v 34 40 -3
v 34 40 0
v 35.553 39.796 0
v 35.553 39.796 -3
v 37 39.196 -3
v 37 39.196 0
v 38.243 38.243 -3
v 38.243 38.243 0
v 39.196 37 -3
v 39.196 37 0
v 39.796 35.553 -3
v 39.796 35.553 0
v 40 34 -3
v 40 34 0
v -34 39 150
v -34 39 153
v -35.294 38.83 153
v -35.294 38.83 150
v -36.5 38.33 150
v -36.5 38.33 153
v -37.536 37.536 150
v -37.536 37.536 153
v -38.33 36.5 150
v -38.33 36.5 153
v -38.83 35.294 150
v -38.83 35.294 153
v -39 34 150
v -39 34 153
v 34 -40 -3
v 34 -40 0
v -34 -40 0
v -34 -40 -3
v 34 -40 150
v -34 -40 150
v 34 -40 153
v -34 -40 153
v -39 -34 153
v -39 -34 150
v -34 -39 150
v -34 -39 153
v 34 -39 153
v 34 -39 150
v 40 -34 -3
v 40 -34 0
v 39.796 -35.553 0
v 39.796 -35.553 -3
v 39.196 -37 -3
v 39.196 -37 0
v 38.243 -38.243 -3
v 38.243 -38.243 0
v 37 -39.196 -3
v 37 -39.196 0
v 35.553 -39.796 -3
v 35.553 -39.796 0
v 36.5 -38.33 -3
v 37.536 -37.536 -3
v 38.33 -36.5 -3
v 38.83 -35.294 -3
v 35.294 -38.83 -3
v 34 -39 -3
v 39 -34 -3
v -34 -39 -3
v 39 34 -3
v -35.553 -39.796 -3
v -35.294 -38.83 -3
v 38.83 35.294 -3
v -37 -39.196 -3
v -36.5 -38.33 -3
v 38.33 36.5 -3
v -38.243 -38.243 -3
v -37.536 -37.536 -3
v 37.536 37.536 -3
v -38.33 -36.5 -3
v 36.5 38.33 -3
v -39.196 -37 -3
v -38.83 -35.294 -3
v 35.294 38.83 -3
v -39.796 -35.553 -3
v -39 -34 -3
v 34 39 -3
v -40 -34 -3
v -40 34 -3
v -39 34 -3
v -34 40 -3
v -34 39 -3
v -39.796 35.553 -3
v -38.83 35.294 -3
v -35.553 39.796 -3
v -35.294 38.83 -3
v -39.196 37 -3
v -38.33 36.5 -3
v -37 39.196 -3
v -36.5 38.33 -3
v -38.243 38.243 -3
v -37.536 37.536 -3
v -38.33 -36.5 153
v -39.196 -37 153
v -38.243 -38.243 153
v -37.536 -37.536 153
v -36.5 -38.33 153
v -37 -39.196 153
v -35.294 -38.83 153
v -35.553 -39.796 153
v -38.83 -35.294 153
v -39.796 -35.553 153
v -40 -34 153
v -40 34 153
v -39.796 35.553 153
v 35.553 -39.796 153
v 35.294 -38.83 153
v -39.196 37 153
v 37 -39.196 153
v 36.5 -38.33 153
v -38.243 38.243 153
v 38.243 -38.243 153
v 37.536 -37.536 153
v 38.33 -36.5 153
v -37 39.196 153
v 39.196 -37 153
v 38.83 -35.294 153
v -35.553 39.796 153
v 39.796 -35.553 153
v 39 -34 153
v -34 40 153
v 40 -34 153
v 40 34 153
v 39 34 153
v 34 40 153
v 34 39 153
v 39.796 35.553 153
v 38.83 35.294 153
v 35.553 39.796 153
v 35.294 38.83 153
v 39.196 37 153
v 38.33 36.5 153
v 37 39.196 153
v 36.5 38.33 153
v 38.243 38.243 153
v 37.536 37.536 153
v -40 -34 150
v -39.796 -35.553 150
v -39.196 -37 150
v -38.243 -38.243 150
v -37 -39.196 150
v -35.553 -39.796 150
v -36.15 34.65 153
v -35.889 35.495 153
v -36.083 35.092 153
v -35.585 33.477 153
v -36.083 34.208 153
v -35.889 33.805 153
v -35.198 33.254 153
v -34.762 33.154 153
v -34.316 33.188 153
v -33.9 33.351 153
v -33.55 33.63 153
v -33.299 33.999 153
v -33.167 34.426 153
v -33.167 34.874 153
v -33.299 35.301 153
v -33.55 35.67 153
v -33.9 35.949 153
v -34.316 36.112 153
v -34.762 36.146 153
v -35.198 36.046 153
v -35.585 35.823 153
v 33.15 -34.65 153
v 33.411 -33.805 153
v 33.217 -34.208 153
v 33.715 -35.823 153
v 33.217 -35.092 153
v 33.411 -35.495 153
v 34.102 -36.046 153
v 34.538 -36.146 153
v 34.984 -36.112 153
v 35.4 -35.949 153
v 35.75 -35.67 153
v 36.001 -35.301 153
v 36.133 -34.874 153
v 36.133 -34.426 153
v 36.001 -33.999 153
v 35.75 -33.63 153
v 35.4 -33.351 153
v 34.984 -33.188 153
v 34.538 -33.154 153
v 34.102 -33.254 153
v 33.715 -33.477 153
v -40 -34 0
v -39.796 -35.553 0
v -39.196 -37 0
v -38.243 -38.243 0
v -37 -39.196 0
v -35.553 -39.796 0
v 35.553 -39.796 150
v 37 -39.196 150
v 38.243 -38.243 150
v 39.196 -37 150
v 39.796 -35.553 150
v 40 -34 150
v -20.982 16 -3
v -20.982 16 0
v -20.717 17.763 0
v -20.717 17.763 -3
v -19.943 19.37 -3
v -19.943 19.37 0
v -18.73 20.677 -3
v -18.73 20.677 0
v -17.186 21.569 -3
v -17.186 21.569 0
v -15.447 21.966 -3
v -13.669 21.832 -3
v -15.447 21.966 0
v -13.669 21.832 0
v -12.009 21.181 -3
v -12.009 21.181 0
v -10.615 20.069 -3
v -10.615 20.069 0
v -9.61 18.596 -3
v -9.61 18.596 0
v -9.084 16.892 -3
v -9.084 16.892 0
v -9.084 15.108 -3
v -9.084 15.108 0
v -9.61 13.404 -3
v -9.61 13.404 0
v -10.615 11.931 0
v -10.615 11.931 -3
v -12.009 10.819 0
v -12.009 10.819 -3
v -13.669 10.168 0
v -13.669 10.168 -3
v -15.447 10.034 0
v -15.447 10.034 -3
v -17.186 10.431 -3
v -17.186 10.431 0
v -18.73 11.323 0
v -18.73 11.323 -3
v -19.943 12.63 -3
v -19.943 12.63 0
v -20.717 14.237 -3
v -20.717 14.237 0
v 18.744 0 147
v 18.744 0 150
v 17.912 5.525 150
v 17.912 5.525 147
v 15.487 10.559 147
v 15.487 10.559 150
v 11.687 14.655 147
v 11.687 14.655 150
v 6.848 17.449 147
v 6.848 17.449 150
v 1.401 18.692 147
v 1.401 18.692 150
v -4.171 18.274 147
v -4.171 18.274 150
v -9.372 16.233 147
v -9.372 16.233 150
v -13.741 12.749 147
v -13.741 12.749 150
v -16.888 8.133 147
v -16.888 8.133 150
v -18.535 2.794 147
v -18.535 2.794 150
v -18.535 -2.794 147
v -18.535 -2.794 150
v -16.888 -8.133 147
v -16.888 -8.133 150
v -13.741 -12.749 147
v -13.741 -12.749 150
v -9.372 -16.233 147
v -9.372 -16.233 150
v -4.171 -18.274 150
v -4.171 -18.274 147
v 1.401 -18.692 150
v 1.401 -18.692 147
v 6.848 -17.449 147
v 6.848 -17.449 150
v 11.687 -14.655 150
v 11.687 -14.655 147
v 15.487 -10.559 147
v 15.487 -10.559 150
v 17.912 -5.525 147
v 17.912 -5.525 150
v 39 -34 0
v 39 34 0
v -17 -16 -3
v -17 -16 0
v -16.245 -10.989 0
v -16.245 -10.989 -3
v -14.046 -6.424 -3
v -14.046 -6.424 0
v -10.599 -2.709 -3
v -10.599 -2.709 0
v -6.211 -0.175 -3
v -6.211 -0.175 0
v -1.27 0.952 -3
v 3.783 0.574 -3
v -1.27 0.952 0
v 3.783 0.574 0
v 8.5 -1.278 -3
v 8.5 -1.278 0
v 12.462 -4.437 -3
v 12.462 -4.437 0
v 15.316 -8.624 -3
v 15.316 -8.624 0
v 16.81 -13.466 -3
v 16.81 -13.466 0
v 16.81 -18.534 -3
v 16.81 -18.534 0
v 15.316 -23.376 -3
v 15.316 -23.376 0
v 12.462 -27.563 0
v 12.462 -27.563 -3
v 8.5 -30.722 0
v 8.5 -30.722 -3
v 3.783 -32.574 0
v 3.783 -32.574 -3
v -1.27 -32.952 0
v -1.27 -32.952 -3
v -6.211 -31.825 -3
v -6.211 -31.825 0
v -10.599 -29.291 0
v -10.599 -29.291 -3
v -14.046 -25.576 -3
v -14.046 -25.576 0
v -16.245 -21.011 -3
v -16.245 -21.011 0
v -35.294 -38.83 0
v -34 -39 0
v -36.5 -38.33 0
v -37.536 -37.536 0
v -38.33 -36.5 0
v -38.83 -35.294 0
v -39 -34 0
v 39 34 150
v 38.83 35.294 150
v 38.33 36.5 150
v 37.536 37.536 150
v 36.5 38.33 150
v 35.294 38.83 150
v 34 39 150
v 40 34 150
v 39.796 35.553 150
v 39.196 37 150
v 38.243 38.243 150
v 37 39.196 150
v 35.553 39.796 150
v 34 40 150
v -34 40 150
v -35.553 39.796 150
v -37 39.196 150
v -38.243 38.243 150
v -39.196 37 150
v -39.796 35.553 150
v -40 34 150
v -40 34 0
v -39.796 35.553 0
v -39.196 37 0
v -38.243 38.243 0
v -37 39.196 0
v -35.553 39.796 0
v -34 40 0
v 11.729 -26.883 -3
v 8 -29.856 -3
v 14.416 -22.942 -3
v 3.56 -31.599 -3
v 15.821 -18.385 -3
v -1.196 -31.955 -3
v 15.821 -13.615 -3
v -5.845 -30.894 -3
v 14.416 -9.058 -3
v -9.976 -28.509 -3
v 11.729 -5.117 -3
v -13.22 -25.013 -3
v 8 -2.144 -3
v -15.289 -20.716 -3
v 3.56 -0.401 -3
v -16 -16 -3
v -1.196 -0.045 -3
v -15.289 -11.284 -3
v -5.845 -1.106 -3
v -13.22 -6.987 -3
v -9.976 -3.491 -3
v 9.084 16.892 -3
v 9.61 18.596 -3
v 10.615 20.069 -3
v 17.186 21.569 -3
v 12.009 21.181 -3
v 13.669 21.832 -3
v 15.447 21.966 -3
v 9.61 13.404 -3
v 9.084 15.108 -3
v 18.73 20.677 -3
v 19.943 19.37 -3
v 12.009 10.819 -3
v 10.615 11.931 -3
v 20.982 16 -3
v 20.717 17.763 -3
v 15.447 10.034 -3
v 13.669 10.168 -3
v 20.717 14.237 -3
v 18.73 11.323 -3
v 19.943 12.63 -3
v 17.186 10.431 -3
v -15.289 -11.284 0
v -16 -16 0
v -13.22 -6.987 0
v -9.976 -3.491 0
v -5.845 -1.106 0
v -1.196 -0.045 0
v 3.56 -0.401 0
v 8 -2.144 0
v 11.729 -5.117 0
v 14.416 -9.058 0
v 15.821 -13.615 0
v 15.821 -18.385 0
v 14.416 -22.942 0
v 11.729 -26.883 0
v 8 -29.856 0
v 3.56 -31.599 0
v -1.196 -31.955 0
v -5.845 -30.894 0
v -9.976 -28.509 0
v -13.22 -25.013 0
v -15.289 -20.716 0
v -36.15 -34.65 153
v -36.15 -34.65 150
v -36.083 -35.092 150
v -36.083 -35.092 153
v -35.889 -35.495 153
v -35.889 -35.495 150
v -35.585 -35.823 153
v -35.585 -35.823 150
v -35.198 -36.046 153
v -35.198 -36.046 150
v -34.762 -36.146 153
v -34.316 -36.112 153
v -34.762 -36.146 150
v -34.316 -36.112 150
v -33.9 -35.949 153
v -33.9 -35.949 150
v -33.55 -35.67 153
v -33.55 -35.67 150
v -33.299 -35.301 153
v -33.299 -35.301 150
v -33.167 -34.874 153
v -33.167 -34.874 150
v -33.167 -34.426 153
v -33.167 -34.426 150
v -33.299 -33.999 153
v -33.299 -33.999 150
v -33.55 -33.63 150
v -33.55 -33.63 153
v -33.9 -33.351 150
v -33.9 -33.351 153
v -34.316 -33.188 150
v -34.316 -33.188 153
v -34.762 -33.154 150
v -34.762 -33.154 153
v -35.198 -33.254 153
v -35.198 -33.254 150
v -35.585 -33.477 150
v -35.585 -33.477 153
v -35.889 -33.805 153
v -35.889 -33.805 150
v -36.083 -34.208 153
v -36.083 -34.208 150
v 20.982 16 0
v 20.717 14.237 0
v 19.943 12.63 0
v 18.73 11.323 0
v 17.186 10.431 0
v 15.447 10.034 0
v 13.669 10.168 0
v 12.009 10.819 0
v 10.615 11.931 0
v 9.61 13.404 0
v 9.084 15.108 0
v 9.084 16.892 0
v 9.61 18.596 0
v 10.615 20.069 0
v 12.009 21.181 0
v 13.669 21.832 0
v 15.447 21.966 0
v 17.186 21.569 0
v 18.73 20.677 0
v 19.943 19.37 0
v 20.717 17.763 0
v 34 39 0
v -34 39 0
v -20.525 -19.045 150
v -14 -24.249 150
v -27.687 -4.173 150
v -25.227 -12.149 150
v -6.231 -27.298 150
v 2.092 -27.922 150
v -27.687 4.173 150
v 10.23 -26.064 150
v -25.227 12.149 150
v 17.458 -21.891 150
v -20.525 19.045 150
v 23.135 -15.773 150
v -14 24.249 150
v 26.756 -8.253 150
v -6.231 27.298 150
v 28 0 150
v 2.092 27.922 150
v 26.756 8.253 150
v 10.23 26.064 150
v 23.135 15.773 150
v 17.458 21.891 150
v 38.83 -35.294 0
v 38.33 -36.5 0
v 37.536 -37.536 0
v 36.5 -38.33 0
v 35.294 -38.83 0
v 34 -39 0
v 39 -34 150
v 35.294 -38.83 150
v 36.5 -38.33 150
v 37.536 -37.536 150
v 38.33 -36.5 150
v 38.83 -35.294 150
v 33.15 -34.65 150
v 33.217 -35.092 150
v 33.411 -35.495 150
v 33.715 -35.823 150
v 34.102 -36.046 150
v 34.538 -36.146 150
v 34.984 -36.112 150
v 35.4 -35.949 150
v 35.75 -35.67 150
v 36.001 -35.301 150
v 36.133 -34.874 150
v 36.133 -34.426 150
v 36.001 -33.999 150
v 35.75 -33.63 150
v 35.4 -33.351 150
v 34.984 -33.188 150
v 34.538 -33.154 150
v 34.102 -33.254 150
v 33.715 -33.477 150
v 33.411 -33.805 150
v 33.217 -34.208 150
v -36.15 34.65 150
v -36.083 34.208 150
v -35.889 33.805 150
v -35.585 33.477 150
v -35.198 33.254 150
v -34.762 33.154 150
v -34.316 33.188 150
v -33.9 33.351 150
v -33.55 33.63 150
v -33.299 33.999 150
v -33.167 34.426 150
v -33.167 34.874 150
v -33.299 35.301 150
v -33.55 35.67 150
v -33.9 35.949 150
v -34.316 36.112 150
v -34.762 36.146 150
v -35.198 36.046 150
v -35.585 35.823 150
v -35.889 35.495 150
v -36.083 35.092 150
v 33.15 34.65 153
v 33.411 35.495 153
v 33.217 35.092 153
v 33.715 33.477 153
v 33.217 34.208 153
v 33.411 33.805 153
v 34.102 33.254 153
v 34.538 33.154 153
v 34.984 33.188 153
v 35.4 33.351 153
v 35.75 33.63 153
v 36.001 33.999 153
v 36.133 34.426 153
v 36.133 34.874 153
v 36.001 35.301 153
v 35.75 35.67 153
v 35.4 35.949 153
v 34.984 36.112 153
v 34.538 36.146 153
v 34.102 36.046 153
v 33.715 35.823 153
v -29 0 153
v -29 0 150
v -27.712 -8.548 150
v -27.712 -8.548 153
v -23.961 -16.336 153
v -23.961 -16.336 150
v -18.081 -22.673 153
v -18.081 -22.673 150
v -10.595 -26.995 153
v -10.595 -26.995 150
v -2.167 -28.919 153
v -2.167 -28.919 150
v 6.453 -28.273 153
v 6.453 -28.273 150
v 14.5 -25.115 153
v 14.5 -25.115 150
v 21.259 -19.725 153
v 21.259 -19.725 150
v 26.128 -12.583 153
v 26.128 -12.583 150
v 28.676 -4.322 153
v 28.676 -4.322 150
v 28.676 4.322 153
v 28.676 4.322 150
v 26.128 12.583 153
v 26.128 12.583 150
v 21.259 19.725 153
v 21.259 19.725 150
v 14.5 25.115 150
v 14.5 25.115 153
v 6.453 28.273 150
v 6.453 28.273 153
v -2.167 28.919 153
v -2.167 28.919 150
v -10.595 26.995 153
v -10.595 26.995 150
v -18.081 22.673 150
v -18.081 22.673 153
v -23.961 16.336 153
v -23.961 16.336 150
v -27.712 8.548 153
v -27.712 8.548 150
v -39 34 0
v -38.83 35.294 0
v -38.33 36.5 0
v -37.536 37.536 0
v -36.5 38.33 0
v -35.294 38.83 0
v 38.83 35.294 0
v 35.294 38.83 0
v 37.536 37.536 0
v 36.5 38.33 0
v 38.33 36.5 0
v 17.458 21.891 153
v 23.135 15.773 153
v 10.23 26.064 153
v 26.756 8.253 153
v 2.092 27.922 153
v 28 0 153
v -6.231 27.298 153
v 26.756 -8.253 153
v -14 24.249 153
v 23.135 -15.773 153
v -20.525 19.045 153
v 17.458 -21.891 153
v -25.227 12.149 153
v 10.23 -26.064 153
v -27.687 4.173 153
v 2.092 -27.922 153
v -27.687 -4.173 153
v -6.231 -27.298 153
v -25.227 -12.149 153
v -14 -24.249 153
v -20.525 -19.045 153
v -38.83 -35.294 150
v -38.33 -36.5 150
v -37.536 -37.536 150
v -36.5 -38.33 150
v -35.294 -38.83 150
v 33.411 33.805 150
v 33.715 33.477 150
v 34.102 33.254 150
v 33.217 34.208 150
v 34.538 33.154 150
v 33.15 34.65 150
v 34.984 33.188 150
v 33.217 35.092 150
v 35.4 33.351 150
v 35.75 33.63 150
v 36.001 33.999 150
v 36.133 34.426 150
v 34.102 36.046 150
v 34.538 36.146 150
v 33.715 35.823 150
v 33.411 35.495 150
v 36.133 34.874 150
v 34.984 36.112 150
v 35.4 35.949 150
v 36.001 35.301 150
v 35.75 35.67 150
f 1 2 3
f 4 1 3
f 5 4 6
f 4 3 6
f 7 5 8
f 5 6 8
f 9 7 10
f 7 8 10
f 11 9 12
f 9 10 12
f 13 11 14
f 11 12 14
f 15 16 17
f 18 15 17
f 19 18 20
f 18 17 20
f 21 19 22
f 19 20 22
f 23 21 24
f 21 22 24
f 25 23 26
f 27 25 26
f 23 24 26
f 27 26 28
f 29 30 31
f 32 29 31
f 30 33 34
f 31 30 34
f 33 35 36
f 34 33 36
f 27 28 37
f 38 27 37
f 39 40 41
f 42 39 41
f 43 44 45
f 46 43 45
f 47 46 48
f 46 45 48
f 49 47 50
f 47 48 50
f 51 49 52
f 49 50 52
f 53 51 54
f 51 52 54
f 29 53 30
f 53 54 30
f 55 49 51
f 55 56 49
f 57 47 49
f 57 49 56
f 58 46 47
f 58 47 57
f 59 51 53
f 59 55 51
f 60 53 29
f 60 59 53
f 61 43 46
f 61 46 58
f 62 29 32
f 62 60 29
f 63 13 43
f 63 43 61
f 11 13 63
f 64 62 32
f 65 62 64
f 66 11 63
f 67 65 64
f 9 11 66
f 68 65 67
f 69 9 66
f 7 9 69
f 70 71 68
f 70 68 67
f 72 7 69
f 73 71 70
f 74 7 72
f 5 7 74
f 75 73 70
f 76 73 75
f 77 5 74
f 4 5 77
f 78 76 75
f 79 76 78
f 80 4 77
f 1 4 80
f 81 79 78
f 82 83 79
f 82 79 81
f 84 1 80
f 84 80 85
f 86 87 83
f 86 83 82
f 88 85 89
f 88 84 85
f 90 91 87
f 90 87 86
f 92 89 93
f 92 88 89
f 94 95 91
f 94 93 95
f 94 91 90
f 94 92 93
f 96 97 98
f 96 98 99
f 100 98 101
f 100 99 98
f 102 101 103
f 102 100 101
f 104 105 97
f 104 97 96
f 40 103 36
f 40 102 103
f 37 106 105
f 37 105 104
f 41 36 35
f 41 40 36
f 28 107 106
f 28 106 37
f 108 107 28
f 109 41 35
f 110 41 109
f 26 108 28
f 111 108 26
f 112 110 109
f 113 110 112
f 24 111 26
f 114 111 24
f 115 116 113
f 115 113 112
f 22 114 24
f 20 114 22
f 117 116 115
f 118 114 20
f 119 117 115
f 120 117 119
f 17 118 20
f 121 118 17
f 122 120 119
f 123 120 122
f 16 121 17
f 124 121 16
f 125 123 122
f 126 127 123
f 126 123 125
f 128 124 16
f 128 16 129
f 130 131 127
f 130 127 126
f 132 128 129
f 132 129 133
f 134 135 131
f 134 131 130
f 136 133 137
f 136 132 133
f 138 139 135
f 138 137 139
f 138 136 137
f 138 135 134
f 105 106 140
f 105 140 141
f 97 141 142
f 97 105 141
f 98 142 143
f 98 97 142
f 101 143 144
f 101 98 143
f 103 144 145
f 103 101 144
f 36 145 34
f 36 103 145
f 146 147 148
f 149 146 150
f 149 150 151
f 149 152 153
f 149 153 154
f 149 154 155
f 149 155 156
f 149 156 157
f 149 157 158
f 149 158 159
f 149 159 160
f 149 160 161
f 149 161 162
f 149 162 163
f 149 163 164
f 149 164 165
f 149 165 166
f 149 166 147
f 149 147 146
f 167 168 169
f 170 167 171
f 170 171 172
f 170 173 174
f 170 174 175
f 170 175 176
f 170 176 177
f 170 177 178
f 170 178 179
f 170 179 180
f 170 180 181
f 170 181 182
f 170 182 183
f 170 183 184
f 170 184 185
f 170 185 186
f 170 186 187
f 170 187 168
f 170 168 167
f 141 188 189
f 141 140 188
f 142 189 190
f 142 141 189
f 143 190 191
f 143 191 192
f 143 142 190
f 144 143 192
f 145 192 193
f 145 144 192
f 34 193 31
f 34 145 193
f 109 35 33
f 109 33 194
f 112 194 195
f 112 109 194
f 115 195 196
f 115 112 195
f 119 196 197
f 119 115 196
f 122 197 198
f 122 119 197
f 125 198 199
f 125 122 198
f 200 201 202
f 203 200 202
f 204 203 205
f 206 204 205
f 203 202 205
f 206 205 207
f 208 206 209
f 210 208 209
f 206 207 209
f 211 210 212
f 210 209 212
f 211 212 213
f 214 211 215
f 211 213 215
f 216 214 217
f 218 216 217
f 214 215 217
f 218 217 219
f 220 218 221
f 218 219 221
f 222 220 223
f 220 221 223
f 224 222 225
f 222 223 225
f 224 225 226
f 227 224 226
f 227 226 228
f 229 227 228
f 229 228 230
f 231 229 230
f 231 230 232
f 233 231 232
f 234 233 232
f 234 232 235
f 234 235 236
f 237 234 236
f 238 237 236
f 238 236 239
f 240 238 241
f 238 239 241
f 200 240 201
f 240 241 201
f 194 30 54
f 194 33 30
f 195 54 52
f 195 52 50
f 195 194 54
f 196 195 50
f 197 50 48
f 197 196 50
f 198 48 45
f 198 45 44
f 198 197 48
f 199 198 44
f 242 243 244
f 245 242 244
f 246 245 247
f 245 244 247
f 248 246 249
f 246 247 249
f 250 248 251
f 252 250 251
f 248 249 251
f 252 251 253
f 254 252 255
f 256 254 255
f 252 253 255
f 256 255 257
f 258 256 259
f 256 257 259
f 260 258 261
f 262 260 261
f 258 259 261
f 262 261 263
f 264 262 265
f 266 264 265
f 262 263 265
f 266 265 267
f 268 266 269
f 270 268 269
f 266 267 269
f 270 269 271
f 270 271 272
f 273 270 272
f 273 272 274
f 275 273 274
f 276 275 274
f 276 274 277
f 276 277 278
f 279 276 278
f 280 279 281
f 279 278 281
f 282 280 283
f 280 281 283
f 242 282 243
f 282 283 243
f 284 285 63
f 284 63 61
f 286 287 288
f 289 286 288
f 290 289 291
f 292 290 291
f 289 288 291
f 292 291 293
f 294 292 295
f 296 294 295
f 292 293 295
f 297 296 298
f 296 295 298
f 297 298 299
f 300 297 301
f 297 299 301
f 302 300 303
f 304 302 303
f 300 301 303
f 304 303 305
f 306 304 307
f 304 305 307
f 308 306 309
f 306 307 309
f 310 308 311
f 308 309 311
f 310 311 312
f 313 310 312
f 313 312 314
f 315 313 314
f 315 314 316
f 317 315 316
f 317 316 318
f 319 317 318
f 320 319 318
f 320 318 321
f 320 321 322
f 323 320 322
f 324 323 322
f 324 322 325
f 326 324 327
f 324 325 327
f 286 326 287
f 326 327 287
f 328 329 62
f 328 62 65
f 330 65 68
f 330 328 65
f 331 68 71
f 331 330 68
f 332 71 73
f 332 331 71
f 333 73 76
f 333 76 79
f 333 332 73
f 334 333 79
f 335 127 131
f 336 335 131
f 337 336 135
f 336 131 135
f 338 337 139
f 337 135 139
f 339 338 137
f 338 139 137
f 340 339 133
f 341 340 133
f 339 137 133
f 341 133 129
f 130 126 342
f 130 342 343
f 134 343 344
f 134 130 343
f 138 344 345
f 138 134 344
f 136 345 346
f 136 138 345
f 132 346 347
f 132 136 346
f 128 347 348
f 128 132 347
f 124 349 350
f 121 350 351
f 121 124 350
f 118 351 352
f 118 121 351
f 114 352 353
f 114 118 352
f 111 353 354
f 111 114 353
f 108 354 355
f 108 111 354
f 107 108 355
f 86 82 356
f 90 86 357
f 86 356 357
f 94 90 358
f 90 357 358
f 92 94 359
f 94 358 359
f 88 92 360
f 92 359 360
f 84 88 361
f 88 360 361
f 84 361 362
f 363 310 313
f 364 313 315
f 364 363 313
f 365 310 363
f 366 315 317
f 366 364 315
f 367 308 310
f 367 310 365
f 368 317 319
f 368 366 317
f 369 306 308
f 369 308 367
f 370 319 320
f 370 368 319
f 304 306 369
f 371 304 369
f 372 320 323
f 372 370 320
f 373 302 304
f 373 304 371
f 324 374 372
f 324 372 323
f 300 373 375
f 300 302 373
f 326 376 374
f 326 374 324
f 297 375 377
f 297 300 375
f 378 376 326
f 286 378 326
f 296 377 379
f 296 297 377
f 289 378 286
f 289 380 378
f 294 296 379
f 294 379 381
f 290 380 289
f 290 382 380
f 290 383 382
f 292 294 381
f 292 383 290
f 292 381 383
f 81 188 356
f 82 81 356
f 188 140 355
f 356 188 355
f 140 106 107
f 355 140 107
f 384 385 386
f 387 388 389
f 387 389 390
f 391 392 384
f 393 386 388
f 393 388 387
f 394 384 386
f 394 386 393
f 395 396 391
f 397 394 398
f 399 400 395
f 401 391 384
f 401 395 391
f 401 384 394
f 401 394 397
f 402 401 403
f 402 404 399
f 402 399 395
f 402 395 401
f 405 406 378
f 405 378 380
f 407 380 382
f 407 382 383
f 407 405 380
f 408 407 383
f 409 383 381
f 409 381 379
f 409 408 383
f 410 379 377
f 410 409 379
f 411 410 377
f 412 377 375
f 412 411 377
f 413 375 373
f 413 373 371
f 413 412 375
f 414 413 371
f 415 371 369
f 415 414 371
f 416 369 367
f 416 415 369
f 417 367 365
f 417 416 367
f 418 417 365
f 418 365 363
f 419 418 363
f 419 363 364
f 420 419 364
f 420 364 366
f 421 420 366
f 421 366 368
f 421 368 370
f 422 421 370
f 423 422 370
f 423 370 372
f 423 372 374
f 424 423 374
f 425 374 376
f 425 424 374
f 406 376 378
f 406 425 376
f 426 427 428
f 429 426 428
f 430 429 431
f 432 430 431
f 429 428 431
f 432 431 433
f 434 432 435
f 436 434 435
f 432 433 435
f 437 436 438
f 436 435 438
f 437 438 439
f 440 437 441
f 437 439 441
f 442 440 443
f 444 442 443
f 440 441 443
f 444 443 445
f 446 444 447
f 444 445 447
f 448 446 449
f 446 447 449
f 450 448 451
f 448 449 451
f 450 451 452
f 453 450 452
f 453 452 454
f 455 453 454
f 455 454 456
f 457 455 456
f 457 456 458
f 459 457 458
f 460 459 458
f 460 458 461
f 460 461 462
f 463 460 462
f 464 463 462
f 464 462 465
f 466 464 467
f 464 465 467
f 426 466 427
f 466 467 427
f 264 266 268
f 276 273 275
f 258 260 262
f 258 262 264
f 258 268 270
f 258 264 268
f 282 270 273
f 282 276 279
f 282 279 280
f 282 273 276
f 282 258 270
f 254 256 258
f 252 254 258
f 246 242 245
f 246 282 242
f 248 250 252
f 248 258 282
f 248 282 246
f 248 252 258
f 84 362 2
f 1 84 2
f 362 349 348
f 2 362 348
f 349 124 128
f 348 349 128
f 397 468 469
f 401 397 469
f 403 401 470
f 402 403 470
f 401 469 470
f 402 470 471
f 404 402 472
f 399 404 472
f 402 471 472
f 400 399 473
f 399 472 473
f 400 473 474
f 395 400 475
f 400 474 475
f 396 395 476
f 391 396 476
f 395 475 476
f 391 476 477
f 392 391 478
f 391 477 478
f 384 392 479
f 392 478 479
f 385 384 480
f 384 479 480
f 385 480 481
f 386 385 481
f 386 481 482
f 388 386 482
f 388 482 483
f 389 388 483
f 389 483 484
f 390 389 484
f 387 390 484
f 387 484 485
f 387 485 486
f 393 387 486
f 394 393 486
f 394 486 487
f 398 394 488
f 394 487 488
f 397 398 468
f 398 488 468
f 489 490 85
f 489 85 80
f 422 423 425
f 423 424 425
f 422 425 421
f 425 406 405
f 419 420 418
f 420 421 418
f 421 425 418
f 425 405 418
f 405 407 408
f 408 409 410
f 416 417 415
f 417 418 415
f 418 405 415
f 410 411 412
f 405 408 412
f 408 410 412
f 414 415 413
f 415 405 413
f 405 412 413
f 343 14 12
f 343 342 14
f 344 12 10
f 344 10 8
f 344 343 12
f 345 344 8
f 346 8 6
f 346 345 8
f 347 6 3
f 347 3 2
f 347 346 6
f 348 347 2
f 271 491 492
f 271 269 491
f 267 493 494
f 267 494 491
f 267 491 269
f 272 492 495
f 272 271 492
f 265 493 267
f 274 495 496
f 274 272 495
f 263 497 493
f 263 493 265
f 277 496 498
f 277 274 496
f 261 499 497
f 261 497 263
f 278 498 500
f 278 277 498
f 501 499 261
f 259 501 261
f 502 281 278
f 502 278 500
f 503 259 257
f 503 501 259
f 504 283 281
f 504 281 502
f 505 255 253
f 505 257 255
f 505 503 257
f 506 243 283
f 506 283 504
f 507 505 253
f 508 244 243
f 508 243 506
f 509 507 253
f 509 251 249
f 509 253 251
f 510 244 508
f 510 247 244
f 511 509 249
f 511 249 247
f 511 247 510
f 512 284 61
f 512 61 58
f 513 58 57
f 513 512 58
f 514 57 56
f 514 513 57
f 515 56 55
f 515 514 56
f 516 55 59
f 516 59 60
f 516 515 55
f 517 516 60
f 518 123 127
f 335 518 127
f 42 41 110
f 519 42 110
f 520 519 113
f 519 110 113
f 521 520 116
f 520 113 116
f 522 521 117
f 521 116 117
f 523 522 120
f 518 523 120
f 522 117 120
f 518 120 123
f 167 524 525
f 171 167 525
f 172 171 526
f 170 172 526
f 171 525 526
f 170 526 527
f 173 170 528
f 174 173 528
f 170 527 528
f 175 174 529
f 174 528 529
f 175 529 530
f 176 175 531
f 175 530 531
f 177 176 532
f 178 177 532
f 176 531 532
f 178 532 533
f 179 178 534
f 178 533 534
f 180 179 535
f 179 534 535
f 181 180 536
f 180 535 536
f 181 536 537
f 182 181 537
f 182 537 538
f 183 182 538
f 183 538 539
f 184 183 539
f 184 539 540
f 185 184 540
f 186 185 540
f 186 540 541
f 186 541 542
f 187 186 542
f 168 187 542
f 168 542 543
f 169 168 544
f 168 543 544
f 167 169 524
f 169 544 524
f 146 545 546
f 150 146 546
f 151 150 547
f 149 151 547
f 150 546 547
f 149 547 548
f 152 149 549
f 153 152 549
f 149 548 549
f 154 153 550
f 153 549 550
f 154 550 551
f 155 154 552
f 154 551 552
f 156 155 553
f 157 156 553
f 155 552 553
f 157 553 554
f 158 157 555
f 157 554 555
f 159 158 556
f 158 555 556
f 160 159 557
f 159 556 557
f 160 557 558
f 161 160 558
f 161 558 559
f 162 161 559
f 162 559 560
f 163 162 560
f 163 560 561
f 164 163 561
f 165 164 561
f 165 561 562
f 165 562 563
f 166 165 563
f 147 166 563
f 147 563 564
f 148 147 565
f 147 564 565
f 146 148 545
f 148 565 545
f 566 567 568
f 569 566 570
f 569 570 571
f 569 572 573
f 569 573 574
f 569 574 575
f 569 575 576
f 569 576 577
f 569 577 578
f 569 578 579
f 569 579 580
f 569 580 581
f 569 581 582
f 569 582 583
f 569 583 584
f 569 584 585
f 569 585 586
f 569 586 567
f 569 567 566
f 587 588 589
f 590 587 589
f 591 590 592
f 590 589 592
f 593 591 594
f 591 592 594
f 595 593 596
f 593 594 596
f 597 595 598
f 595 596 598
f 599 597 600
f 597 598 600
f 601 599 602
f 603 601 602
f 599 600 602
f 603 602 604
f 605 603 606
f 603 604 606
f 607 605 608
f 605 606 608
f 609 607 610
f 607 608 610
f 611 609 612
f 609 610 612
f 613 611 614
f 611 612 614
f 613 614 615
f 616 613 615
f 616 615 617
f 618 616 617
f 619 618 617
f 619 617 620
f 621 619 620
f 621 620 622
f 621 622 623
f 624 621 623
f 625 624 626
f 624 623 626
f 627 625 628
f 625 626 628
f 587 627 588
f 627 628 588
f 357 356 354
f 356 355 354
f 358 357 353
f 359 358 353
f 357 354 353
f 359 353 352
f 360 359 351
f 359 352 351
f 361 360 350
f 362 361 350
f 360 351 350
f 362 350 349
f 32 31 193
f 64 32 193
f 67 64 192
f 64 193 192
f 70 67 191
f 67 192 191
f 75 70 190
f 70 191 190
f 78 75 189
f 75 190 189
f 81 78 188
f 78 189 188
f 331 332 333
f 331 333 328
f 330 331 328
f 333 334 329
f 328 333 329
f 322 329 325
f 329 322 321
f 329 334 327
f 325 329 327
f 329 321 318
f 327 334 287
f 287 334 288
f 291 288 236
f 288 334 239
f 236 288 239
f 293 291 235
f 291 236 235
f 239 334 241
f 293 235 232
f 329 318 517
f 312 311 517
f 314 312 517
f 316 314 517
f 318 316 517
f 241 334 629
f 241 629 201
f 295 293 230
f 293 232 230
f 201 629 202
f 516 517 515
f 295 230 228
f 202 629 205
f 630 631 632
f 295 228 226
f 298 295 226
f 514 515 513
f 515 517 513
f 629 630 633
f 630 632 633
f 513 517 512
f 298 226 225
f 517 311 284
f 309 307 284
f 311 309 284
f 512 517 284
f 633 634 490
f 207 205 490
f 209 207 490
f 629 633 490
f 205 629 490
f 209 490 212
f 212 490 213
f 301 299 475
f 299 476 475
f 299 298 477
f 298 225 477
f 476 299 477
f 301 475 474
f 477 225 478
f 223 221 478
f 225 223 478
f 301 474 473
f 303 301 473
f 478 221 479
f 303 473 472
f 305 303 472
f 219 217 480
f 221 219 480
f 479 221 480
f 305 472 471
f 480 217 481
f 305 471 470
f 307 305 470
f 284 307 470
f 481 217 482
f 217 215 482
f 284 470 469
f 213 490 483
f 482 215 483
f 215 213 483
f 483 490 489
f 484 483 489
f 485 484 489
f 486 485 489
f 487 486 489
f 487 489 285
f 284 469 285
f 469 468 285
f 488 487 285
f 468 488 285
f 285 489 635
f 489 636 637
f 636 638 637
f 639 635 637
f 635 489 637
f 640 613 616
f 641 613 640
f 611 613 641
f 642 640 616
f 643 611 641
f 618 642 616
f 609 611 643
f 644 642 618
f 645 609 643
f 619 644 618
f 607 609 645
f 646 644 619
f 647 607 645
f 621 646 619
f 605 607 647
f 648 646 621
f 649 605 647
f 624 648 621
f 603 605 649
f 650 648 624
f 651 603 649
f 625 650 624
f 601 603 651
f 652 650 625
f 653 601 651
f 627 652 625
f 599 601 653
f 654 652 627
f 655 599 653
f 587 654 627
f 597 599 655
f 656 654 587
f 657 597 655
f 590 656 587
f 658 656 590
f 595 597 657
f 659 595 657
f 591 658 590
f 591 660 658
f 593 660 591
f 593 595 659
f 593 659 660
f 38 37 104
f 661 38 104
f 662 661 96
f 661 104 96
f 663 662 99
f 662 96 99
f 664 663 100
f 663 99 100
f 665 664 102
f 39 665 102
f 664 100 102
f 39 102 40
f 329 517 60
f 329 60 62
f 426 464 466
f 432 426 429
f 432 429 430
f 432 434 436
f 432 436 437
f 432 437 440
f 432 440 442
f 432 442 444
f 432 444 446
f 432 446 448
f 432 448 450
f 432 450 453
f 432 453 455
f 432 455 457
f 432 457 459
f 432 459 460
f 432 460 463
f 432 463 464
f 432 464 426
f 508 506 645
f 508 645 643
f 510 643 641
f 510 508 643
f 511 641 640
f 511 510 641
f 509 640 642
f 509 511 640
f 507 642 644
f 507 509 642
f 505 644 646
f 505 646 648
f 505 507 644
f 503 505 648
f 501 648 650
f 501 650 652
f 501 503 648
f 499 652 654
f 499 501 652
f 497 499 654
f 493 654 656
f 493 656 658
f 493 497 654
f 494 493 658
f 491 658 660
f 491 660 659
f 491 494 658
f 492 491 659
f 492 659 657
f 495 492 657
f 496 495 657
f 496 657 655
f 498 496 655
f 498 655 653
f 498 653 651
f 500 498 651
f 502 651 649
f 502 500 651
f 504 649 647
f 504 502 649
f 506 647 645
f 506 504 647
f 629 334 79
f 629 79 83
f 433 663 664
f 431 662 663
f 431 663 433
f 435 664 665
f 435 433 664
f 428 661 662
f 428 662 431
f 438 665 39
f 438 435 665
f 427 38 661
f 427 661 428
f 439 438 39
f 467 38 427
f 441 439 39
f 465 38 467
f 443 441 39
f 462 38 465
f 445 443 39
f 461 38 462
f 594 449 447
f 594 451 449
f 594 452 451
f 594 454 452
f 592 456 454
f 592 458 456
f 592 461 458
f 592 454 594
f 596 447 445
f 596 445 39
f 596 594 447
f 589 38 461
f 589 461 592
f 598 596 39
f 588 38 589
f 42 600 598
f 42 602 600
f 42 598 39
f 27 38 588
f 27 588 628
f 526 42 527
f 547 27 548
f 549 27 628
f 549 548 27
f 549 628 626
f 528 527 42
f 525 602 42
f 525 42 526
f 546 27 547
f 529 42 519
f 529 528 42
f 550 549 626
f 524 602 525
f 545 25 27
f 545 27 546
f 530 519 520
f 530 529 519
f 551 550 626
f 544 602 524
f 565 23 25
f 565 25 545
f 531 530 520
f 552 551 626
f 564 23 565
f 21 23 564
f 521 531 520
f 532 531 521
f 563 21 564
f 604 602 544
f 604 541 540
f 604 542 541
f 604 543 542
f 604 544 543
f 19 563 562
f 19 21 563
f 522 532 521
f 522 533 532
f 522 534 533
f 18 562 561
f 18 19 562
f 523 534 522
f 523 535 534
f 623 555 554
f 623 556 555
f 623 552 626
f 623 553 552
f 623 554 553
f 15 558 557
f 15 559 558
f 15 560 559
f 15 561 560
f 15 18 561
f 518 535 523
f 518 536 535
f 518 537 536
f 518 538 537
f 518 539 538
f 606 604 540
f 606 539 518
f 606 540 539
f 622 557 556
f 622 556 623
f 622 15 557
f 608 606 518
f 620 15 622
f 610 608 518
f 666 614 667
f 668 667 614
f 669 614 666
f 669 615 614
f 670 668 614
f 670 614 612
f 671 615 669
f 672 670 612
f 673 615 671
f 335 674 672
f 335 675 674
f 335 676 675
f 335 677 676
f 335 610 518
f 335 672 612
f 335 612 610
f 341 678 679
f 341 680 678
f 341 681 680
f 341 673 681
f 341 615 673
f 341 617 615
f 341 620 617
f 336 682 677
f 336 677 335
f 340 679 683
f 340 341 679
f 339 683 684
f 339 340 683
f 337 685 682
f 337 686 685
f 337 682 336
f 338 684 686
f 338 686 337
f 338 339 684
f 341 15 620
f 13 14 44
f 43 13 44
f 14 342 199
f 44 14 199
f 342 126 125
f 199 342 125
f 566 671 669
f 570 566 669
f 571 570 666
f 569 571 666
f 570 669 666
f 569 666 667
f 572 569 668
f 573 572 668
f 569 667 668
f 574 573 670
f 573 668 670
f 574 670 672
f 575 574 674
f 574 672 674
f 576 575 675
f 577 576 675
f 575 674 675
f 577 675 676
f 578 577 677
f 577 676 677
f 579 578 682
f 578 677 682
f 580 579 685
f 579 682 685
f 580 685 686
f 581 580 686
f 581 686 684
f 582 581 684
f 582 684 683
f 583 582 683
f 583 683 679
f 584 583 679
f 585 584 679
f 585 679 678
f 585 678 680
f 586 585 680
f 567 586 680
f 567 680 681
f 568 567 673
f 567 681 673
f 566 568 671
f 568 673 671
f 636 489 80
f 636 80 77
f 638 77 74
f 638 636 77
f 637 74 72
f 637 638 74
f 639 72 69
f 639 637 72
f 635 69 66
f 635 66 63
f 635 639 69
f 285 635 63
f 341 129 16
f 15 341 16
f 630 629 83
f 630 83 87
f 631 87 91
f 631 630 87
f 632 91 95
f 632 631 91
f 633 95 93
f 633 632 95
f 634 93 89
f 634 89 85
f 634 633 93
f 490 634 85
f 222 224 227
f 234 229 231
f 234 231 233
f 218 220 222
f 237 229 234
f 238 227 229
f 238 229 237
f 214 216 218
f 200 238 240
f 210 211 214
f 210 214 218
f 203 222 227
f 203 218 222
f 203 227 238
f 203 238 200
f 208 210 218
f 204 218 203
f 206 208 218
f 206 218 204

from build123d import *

# Parameters (mm, degrees)
SKETCH_2_W          = 80
SKETCH_2_H          = 80
EXTRUDE_1_DEPTH     = 150
FILLET_1_R          = 6
EXTRUDE_START       = 3
EXTRUDE_2_DEPTH     = 3
EXTRUDE_5_DEPTH     = 3
SKETCH_7_R          = 17
SKETCH_7_R_2        = 16
SKETCH_7_R_3        = 5.982349016
EXTRUDE_6_DEPTH     = 3
SKETCH_8_R          = 29
SKETCH_8_R_2        = 28
EXTRUDE_7_DEPTH     = 3
SKETCH_9_R          = 1.5
EXTRUDE_8_DEPTH     = 3
SKETCH_10_R         = 18.744403632
CUT_EXTRUDE_1_DEPTH = 3


with BuildPart() as part:
    # 草图2 → 凸台-拉伸1 (new body)
    with BuildSketch(Plane.XY):
        Rectangle(SKETCH_2_W, SKETCH_2_H)
    extrude(amount=EXTRUDE_1_DEPTH)

    # 圆角1
    fillet_1_edges = [part.edges().sort_by_distance(p)[0] for p in [
        (40, -40, 75),
        (-40, -40, 75),
        (-40, 40, 75),
        (40, 40, 75),
    ]]
    fillet(fillet_1_edges, radius=FILLET_1_R)

    # 草图3 → 凸台-拉伸2 (add)
    with BuildSketch(Plane.XY.offset(150).offset(EXTRUDE_START)):
        with BuildLine():
            Line((-40, 34), (-40, -34))
            ThreePointArc((-40, -34), (-38.242640687, -38.242640687), (-34, -40))
            Line((-34, -40), (34, -40))
            ThreePointArc((34, -40), (38.242640687, -38.242640687), (40, -34))
            Line((40, -34), (40, 34))
            ThreePointArc((40, 34), (38.242640687, 38.242640687), (34, 40))
            Line((34, 40), (-34, 40))
            ThreePointArc((-34, 40), (-38.242640687, 38.242640687), (-40, 34))
        make_face()
        with BuildLine():
            Line((34, 39), (-34, 39))
            ThreePointArc((-34, 39), (-37.535533906, 37.535533906), (-39, 34))
            Line((-39, 34), (-39, -34))
            ThreePointArc((-39, -34), (-37.535533906, -37.535533906), (-34, -39))
            Line((-34, -39), (34, -39))
            ThreePointArc((34, -39), (37.535533906, -37.535533906), (39, -34))
            Line((39, -34), (39, 34))
            ThreePointArc((39, 34), (37.535533906, 37.535533906), (34, 39))
        make_face(mode=Mode.SUBTRACT)
    extrude(amount=-EXTRUDE_2_DEPTH)

    # 草图6 → 凸台-拉伸5 (add)
    with BuildSketch(Plane(origin=(0, 0, 0), x_dir=(-1, 0, 0), z_dir=(0, 0, -1))):
        with BuildLine():
            Line((-34, -40), (34, -40))
            ThreePointArc((34, -40), (38.242640687, -38.242640687), (40, -34))
            Line((40, -34), (40, 34))
            ThreePointArc((40, 34), (38.242640687, 38.242640687), (34, 40))
            Line((34, 40), (-34, 40))
            ThreePointArc((-34, 40), (-38.242640687, 38.242640687), (-40, 34))
            Line((-40, 34), (-40, -34))
            ThreePointArc((-40, -34), (-38.242640687, -38.242640687), (-34, -40))
        make_face()
        with BuildLine():
            Line((34, 39), (-34, 39))
            ThreePointArc((-34, 39), (-37.535533906, 37.535533906), (-39, 34))
            Line((-39, 34), (-39, -34))
            ThreePointArc((-39, -34), (-37.535533906, -37.535533906), (-34, -39))
            Line((-34, -39), (34, -39))
            ThreePointArc((34, -39), (37.535533906, -37.535533906), (39, -34))
            Line((39, -34), (39, 34))
            ThreePointArc((39, 34), (37.535533906, 37.535533906), (34, 39))
        make_face(mode=Mode.SUBTRACT)
    extrude(amount=EXTRUDE_5_DEPTH)

    # 草图7 → 凸台-拉伸6 (add)
    # profile 1 of 3: a face of its own
    with BuildSketch(Plane(origin=(0, 0, 0), x_dir=(-1, 0, 0), z_dir=(0, 0, -1))):
        with Locations((0, -16)):
            Circle(SKETCH_7_R)
        with Locations((0, -16)):
            Circle(SKETCH_7_R_2, mode=Mode.SUBTRACT)
    # profile 2 of 3: a face of its own
    with BuildSketch(Plane(origin=(0, 0, 0), x_dir=(-1, 0, 0), z_dir=(0, 0, -1))):
        with Locations((15, 16)):
            Circle(SKETCH_7_R_3)
    # profile 3 of 3: a face of its own
    with BuildSketch(Plane(origin=(0, 0, 0), x_dir=(-1, 0, 0), z_dir=(0, 0, -1))):
        with Locations(Location((-15, 16, 0), (0, 0, 180))):
            Circle(SKETCH_7_R_3)
    extrude(amount=EXTRUDE_6_DEPTH)

    # 草图8 → 凸台-拉伸7 (add)
    with BuildSketch(Plane.XY.offset(150)):
        with Locations(Location((0, 0, 0), (0, 0, 180))):
            Circle(SKETCH_8_R)
        Circle(SKETCH_8_R_2, mode=Mode.SUBTRACT)
    extrude(amount=EXTRUDE_7_DEPTH)

    # 草图9 → 凸台-拉伸8 (add)
    with BuildSketch(Plane.XY.offset(150)):
        with Locations(Location((-34.649983427, 34.649983427, 0), (0, 0, 180))):
            Circle(SKETCH_9_R)
        with Locations(Location((34.649983427, 34.649983427, 0), (0, 0, 180))):
            Circle(SKETCH_9_R)
        with Locations(Location((34.649983427, -34.649983427, 0), (0, 0, 180))):
            Circle(SKETCH_9_R)
        with Locations(Location((-34.649983427, -34.649983427, 0), (0, 0, 180))):
            Circle(SKETCH_9_R)
    extrude(amount=EXTRUDE_8_DEPTH)

    # 草图10 → 切除-拉伸1 (cut)
    with BuildSketch(Plane.XY.offset(150)):
        Circle(SKETCH_10_R)
    extrude(amount=-CUT_EXTRUDE_1_DEPTH, mode=Mode.SUBTRACT)


solid = part.part
